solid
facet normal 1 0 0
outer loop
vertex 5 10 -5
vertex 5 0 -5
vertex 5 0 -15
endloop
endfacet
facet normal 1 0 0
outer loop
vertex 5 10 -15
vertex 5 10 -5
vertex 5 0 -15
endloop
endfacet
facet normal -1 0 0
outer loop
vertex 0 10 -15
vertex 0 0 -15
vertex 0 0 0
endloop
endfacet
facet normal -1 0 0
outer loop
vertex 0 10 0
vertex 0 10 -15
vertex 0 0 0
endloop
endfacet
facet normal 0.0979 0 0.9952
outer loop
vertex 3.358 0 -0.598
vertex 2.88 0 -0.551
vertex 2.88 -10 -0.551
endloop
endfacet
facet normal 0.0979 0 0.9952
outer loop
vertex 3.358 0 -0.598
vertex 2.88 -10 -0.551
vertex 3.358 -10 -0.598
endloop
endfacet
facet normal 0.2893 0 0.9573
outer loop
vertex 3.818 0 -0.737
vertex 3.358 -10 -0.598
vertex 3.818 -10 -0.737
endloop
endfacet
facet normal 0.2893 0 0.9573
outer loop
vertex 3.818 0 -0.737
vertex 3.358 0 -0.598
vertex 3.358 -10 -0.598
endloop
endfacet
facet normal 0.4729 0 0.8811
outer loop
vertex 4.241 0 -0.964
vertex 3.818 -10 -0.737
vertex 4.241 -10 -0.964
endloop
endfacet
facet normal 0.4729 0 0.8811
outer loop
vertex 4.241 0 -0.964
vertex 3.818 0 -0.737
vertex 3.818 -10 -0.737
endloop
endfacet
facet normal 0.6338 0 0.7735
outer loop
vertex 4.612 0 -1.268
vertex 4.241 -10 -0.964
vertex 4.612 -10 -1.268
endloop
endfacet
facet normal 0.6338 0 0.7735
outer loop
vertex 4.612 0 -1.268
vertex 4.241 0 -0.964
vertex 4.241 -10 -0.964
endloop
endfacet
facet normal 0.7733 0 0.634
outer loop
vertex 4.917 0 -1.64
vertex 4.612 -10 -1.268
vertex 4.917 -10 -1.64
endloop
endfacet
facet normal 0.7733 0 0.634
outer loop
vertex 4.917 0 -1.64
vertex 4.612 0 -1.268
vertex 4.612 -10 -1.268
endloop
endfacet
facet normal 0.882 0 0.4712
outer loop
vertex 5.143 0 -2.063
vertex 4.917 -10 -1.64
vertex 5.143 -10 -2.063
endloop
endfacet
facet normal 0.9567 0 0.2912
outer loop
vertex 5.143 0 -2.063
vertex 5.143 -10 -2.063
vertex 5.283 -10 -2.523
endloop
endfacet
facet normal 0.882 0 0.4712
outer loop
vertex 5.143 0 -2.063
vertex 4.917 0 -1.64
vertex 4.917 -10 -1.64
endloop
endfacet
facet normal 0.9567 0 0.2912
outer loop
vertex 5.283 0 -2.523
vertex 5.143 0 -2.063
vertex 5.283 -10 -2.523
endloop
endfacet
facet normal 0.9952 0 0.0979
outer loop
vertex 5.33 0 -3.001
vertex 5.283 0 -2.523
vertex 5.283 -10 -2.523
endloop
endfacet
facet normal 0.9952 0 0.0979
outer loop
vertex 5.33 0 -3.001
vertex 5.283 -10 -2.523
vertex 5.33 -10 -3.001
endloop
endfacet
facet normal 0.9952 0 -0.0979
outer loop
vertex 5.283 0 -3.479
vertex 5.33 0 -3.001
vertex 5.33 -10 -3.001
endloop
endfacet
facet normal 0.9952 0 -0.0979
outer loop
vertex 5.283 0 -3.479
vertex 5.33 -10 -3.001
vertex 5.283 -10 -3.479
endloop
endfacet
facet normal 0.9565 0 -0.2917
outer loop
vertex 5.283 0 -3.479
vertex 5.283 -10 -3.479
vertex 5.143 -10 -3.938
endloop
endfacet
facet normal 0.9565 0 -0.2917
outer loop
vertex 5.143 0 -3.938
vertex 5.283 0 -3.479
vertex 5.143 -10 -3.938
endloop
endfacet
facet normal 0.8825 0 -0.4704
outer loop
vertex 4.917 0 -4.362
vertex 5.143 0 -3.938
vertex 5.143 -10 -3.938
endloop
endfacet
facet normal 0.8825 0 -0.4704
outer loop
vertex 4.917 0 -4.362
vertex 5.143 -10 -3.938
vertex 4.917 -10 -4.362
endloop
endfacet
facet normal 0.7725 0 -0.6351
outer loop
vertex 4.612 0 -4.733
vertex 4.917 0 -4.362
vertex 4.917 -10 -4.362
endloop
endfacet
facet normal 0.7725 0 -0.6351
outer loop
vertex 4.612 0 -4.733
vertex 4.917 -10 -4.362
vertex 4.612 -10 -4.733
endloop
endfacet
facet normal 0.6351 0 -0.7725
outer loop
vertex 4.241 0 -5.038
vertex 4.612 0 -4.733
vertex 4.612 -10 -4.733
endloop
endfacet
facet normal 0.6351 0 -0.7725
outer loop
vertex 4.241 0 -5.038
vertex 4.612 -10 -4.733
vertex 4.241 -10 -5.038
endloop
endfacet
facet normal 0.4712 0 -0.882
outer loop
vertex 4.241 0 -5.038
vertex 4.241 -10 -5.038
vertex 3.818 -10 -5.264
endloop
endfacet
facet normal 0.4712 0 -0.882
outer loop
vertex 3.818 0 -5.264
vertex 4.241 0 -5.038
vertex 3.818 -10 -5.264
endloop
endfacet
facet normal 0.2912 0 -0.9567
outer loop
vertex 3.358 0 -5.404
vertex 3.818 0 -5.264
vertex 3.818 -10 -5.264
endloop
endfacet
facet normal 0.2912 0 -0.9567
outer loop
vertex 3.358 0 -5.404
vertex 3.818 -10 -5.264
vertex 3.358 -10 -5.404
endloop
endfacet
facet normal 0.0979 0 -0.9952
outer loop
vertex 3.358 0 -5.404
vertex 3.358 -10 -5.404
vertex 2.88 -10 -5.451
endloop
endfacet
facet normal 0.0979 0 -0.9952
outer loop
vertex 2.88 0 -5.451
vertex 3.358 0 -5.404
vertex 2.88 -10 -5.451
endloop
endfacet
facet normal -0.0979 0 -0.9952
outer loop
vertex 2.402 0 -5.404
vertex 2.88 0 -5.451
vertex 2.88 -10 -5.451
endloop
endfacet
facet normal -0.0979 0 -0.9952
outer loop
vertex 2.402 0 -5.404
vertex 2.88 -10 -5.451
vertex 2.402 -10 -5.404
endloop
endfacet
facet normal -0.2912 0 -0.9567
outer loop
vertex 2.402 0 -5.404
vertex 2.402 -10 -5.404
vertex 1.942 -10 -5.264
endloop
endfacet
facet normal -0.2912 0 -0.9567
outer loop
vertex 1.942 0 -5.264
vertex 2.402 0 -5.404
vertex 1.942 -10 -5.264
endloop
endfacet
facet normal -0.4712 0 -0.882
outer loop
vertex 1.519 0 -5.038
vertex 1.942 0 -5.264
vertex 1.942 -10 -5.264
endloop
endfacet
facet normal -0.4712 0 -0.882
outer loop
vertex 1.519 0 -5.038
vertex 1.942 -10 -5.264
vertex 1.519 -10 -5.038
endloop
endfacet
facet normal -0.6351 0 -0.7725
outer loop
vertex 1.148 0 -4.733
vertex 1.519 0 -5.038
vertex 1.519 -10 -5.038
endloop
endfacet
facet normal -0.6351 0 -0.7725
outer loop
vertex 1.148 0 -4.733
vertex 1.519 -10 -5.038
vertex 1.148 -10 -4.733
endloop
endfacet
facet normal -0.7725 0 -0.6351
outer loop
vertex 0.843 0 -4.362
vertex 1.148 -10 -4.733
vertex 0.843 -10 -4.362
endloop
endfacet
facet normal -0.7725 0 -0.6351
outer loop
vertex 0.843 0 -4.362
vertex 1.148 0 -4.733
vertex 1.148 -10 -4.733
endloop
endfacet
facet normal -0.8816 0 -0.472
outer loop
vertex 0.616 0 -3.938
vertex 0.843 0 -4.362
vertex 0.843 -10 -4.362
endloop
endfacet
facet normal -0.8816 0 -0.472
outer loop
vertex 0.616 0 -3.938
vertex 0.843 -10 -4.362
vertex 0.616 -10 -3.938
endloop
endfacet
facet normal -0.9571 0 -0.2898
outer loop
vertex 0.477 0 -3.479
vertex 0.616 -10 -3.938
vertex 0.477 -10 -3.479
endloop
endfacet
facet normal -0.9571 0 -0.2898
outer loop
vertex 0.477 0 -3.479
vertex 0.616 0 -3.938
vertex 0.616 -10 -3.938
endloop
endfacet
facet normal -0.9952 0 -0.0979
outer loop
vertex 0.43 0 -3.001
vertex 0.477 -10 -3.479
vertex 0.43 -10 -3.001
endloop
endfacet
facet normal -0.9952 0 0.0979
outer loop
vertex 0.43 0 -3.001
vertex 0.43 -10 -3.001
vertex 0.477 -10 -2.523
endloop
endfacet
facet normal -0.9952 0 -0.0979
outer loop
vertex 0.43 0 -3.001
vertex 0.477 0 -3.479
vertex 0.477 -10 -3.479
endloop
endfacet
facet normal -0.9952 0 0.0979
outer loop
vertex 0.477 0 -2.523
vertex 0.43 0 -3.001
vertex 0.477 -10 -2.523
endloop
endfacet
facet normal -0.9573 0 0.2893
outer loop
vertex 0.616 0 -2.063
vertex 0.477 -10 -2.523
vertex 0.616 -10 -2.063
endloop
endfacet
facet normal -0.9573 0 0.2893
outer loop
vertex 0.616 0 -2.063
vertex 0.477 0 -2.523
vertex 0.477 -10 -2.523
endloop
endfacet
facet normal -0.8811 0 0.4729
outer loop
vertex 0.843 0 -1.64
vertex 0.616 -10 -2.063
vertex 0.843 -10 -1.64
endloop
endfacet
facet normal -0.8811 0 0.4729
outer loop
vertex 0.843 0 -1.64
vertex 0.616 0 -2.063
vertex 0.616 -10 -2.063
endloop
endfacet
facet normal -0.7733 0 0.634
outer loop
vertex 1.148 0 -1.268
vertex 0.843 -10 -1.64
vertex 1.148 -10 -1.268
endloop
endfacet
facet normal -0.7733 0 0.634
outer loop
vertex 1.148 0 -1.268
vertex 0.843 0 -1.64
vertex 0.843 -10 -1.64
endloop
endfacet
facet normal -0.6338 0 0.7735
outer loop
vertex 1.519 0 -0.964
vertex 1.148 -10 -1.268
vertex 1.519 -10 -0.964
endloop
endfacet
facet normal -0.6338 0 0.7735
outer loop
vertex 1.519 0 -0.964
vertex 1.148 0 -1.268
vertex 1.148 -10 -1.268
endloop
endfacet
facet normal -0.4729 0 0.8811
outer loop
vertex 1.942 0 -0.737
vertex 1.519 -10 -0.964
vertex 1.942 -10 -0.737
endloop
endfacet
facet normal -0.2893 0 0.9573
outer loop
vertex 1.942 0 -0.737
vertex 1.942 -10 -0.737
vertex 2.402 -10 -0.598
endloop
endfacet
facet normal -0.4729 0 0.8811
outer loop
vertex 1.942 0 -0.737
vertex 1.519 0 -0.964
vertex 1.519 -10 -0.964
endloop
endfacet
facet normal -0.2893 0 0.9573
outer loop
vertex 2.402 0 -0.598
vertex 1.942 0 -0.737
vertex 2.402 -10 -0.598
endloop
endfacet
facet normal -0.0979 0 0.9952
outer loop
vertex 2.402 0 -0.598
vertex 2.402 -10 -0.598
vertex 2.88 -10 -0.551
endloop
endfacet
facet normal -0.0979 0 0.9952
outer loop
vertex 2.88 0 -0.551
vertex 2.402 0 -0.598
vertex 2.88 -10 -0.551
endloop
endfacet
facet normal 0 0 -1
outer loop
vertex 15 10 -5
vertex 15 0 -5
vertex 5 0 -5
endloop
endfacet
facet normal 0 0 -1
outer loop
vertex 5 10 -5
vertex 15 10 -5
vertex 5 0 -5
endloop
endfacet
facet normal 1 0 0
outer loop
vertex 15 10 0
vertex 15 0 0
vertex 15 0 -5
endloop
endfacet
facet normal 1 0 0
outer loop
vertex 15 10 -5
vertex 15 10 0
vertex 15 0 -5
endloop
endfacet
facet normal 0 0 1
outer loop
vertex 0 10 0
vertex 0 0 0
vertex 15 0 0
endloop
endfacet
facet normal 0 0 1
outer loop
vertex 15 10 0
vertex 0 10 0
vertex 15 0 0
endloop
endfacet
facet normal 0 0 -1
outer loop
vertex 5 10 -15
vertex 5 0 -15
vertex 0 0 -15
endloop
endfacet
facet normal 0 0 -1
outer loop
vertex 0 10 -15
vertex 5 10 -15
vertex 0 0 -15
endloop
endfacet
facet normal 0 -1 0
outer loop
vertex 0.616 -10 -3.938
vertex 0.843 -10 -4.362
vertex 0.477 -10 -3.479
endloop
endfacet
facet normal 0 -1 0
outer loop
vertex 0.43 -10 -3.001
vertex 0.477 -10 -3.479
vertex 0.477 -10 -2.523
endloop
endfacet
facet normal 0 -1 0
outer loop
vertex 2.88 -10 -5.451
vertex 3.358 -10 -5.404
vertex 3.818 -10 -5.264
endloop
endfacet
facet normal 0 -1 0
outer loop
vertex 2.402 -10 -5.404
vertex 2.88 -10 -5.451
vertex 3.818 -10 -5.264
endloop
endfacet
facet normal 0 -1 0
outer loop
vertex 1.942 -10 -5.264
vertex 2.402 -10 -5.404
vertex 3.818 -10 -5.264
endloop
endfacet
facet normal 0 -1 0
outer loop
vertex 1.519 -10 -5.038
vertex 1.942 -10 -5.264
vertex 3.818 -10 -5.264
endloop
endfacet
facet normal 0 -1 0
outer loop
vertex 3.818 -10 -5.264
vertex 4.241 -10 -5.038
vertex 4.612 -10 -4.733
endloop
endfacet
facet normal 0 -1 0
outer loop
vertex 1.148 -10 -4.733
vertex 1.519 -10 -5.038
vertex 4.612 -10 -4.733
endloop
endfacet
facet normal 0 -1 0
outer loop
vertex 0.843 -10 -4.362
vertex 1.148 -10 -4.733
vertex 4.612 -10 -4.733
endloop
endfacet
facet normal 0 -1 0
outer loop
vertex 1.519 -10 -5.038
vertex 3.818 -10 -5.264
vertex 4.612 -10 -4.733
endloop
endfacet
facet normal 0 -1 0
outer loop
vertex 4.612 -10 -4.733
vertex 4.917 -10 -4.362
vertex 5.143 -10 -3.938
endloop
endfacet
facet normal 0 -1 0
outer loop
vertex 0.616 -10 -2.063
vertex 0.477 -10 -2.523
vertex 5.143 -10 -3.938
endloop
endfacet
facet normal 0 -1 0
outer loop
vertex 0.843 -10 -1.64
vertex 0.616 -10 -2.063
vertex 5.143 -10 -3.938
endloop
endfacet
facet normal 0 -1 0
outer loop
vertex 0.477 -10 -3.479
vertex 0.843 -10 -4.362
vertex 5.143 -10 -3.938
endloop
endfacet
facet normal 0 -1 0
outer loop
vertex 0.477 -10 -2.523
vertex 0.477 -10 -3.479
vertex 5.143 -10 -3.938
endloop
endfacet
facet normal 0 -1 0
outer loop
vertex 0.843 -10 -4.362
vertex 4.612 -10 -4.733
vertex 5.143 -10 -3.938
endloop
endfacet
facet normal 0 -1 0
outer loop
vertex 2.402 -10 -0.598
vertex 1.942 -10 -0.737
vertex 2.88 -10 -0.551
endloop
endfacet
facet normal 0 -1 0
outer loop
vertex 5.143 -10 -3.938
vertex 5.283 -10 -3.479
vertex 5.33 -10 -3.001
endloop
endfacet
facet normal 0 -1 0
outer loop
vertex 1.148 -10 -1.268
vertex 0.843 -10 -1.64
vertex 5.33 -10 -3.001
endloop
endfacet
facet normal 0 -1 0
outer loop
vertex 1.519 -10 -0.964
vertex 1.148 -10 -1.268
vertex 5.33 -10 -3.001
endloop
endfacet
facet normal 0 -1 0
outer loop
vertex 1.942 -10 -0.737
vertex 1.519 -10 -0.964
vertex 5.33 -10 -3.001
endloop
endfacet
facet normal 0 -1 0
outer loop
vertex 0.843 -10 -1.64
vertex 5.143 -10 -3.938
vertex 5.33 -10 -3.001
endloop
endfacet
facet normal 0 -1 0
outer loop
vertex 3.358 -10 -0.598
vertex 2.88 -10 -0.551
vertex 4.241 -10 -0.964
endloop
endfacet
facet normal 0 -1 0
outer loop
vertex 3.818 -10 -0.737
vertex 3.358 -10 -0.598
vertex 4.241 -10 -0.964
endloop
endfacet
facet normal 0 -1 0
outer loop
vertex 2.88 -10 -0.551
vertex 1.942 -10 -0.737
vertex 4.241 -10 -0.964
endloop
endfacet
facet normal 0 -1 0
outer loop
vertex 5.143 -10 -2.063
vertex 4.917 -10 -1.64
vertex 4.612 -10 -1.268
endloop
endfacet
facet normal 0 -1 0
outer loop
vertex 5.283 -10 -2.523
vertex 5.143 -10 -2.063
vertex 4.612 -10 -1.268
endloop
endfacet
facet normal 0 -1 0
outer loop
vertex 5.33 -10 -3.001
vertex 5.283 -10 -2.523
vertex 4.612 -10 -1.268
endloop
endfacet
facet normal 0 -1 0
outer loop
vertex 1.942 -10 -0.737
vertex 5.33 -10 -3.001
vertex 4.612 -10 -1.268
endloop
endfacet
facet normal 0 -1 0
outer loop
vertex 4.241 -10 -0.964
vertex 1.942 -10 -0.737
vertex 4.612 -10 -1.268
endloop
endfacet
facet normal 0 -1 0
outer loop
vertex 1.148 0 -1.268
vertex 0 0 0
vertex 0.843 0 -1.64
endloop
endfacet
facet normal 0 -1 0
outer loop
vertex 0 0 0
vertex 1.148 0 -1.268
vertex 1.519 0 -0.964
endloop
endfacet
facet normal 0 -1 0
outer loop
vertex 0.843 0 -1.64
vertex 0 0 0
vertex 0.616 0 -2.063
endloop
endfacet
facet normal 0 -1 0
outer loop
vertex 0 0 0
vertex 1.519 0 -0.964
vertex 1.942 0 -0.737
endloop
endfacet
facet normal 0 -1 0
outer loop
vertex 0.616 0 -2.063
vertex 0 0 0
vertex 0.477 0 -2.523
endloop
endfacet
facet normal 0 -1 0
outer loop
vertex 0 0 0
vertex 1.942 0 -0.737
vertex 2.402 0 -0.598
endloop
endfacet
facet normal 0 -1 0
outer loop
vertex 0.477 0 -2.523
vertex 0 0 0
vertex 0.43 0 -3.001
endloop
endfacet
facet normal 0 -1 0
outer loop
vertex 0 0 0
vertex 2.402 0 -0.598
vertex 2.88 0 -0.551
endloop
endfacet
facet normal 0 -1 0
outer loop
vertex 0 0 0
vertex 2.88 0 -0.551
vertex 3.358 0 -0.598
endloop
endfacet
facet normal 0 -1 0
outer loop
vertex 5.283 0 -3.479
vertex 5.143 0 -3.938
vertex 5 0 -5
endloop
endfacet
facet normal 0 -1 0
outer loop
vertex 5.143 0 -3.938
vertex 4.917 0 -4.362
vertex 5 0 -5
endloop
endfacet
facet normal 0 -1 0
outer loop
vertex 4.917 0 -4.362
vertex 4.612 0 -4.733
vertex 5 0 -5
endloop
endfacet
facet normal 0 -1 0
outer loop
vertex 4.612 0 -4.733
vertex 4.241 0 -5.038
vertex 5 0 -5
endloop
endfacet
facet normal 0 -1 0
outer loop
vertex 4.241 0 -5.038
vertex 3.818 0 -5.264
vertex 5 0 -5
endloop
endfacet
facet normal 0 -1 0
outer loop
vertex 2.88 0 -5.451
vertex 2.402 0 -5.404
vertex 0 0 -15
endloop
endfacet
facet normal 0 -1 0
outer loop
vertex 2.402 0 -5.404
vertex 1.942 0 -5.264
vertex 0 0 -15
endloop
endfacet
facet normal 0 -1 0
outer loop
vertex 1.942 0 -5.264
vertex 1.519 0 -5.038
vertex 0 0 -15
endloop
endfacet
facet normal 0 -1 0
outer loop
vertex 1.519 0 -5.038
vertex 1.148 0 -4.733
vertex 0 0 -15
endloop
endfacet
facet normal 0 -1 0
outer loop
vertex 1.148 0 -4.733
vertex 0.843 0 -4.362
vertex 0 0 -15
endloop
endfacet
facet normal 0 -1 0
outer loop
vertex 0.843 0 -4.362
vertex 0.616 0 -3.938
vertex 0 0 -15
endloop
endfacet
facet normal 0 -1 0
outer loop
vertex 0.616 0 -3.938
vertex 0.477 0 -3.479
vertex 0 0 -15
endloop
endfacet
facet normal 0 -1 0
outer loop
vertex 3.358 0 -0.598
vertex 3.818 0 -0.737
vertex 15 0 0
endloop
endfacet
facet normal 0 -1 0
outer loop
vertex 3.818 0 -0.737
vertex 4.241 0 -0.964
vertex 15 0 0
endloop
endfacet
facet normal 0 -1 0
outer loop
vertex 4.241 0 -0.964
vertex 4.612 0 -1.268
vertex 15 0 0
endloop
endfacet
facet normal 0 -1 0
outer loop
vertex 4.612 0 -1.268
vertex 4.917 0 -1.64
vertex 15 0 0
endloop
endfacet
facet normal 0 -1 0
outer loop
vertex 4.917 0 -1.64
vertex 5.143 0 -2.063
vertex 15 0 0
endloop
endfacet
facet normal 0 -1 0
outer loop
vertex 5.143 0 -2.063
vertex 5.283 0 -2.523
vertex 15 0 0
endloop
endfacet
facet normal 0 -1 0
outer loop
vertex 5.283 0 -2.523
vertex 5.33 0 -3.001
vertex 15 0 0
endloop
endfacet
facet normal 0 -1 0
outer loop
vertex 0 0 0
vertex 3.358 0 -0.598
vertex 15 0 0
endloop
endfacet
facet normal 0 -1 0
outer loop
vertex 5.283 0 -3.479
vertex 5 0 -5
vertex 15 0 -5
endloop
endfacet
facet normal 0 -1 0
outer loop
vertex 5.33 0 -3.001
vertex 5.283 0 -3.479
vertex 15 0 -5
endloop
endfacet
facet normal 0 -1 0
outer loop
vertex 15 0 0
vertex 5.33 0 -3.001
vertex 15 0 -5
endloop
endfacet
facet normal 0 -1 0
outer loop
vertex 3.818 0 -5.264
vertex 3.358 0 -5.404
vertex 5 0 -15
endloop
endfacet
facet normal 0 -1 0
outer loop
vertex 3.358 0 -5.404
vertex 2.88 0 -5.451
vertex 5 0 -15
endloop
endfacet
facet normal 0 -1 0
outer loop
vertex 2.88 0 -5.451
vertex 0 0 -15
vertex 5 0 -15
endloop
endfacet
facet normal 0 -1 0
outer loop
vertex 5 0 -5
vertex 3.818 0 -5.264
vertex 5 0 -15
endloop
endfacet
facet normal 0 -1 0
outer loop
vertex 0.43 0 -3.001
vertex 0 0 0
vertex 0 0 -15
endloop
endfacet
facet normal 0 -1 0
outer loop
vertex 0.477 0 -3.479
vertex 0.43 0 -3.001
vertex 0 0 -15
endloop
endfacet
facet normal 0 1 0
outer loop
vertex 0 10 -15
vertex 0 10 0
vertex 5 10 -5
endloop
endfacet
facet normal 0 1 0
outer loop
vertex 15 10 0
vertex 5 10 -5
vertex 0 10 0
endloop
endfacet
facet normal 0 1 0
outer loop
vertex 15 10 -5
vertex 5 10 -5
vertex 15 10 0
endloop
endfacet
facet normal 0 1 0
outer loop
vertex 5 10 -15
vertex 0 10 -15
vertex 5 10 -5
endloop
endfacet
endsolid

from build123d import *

# Parameters (mm, degrees)
SKETCH1_R           = 2.5
BOSS_EXTRUDE1_DEPTH = 10
SKETCH2_R           = 2.45
BOSS_EXTRUDE2_DEPTH = 20
BOSS_EXTRUDE3_START = -10
SKETCH3_R           = 2.5
BOSS_EXTRUDE3_DEPTH = 10


with BuildPart() as part:
    # Sketch1 → Boss-Extrude1 (new body)
    with BuildSketch(Plane(origin=(0, 0, 0), x_dir=(1, 0, 0), z_dir=(0, 1, 0))):
        Polygon((0, 15), (0, 0), (15, 0), (15, 5), (5, 5), (5, 15), align=None)
        with Locations(Location((2.879948547, 3.000793191, 0), (0, 0, 270))):
            Circle(SKETCH1_R, mode=Mode.SUBTRACT)
    extrude(amount=BOSS_EXTRUDE1_DEPTH)



with BuildPart() as body_2:
    # Sketch2 → Boss-Extrude2 (new body)
    with BuildSketch(Plane(origin=(0, 10, 0), x_dir=(1, 0, 0), z_dir=(0, 1, 0))):
        with Locations(Location((2.879948547, 3.000793191, 0), (0, 0, 270))):
            Circle(SKETCH2_R)
    extrude(amount=-BOSS_EXTRUDE2_DEPTH)


with BuildPart() as part_1:
    add(part.part)

    add(body_2.part)  # Boss-Extrude3 merges body 2
    # Sketch3 → Boss-Extrude3 (add)
    with BuildSketch(Plane(origin=(0, 10, 0), x_dir=(1, 0, 0), z_dir=(0, 1, 0)).offset(BOSS_EXTRUDE3_START)):
        with Locations((2.879948547, 3.000793191)):
            Circle(SKETCH3_R)
    extrude(amount=BOSS_EXTRUDE3_DEPTH)


solid = part_1.part
